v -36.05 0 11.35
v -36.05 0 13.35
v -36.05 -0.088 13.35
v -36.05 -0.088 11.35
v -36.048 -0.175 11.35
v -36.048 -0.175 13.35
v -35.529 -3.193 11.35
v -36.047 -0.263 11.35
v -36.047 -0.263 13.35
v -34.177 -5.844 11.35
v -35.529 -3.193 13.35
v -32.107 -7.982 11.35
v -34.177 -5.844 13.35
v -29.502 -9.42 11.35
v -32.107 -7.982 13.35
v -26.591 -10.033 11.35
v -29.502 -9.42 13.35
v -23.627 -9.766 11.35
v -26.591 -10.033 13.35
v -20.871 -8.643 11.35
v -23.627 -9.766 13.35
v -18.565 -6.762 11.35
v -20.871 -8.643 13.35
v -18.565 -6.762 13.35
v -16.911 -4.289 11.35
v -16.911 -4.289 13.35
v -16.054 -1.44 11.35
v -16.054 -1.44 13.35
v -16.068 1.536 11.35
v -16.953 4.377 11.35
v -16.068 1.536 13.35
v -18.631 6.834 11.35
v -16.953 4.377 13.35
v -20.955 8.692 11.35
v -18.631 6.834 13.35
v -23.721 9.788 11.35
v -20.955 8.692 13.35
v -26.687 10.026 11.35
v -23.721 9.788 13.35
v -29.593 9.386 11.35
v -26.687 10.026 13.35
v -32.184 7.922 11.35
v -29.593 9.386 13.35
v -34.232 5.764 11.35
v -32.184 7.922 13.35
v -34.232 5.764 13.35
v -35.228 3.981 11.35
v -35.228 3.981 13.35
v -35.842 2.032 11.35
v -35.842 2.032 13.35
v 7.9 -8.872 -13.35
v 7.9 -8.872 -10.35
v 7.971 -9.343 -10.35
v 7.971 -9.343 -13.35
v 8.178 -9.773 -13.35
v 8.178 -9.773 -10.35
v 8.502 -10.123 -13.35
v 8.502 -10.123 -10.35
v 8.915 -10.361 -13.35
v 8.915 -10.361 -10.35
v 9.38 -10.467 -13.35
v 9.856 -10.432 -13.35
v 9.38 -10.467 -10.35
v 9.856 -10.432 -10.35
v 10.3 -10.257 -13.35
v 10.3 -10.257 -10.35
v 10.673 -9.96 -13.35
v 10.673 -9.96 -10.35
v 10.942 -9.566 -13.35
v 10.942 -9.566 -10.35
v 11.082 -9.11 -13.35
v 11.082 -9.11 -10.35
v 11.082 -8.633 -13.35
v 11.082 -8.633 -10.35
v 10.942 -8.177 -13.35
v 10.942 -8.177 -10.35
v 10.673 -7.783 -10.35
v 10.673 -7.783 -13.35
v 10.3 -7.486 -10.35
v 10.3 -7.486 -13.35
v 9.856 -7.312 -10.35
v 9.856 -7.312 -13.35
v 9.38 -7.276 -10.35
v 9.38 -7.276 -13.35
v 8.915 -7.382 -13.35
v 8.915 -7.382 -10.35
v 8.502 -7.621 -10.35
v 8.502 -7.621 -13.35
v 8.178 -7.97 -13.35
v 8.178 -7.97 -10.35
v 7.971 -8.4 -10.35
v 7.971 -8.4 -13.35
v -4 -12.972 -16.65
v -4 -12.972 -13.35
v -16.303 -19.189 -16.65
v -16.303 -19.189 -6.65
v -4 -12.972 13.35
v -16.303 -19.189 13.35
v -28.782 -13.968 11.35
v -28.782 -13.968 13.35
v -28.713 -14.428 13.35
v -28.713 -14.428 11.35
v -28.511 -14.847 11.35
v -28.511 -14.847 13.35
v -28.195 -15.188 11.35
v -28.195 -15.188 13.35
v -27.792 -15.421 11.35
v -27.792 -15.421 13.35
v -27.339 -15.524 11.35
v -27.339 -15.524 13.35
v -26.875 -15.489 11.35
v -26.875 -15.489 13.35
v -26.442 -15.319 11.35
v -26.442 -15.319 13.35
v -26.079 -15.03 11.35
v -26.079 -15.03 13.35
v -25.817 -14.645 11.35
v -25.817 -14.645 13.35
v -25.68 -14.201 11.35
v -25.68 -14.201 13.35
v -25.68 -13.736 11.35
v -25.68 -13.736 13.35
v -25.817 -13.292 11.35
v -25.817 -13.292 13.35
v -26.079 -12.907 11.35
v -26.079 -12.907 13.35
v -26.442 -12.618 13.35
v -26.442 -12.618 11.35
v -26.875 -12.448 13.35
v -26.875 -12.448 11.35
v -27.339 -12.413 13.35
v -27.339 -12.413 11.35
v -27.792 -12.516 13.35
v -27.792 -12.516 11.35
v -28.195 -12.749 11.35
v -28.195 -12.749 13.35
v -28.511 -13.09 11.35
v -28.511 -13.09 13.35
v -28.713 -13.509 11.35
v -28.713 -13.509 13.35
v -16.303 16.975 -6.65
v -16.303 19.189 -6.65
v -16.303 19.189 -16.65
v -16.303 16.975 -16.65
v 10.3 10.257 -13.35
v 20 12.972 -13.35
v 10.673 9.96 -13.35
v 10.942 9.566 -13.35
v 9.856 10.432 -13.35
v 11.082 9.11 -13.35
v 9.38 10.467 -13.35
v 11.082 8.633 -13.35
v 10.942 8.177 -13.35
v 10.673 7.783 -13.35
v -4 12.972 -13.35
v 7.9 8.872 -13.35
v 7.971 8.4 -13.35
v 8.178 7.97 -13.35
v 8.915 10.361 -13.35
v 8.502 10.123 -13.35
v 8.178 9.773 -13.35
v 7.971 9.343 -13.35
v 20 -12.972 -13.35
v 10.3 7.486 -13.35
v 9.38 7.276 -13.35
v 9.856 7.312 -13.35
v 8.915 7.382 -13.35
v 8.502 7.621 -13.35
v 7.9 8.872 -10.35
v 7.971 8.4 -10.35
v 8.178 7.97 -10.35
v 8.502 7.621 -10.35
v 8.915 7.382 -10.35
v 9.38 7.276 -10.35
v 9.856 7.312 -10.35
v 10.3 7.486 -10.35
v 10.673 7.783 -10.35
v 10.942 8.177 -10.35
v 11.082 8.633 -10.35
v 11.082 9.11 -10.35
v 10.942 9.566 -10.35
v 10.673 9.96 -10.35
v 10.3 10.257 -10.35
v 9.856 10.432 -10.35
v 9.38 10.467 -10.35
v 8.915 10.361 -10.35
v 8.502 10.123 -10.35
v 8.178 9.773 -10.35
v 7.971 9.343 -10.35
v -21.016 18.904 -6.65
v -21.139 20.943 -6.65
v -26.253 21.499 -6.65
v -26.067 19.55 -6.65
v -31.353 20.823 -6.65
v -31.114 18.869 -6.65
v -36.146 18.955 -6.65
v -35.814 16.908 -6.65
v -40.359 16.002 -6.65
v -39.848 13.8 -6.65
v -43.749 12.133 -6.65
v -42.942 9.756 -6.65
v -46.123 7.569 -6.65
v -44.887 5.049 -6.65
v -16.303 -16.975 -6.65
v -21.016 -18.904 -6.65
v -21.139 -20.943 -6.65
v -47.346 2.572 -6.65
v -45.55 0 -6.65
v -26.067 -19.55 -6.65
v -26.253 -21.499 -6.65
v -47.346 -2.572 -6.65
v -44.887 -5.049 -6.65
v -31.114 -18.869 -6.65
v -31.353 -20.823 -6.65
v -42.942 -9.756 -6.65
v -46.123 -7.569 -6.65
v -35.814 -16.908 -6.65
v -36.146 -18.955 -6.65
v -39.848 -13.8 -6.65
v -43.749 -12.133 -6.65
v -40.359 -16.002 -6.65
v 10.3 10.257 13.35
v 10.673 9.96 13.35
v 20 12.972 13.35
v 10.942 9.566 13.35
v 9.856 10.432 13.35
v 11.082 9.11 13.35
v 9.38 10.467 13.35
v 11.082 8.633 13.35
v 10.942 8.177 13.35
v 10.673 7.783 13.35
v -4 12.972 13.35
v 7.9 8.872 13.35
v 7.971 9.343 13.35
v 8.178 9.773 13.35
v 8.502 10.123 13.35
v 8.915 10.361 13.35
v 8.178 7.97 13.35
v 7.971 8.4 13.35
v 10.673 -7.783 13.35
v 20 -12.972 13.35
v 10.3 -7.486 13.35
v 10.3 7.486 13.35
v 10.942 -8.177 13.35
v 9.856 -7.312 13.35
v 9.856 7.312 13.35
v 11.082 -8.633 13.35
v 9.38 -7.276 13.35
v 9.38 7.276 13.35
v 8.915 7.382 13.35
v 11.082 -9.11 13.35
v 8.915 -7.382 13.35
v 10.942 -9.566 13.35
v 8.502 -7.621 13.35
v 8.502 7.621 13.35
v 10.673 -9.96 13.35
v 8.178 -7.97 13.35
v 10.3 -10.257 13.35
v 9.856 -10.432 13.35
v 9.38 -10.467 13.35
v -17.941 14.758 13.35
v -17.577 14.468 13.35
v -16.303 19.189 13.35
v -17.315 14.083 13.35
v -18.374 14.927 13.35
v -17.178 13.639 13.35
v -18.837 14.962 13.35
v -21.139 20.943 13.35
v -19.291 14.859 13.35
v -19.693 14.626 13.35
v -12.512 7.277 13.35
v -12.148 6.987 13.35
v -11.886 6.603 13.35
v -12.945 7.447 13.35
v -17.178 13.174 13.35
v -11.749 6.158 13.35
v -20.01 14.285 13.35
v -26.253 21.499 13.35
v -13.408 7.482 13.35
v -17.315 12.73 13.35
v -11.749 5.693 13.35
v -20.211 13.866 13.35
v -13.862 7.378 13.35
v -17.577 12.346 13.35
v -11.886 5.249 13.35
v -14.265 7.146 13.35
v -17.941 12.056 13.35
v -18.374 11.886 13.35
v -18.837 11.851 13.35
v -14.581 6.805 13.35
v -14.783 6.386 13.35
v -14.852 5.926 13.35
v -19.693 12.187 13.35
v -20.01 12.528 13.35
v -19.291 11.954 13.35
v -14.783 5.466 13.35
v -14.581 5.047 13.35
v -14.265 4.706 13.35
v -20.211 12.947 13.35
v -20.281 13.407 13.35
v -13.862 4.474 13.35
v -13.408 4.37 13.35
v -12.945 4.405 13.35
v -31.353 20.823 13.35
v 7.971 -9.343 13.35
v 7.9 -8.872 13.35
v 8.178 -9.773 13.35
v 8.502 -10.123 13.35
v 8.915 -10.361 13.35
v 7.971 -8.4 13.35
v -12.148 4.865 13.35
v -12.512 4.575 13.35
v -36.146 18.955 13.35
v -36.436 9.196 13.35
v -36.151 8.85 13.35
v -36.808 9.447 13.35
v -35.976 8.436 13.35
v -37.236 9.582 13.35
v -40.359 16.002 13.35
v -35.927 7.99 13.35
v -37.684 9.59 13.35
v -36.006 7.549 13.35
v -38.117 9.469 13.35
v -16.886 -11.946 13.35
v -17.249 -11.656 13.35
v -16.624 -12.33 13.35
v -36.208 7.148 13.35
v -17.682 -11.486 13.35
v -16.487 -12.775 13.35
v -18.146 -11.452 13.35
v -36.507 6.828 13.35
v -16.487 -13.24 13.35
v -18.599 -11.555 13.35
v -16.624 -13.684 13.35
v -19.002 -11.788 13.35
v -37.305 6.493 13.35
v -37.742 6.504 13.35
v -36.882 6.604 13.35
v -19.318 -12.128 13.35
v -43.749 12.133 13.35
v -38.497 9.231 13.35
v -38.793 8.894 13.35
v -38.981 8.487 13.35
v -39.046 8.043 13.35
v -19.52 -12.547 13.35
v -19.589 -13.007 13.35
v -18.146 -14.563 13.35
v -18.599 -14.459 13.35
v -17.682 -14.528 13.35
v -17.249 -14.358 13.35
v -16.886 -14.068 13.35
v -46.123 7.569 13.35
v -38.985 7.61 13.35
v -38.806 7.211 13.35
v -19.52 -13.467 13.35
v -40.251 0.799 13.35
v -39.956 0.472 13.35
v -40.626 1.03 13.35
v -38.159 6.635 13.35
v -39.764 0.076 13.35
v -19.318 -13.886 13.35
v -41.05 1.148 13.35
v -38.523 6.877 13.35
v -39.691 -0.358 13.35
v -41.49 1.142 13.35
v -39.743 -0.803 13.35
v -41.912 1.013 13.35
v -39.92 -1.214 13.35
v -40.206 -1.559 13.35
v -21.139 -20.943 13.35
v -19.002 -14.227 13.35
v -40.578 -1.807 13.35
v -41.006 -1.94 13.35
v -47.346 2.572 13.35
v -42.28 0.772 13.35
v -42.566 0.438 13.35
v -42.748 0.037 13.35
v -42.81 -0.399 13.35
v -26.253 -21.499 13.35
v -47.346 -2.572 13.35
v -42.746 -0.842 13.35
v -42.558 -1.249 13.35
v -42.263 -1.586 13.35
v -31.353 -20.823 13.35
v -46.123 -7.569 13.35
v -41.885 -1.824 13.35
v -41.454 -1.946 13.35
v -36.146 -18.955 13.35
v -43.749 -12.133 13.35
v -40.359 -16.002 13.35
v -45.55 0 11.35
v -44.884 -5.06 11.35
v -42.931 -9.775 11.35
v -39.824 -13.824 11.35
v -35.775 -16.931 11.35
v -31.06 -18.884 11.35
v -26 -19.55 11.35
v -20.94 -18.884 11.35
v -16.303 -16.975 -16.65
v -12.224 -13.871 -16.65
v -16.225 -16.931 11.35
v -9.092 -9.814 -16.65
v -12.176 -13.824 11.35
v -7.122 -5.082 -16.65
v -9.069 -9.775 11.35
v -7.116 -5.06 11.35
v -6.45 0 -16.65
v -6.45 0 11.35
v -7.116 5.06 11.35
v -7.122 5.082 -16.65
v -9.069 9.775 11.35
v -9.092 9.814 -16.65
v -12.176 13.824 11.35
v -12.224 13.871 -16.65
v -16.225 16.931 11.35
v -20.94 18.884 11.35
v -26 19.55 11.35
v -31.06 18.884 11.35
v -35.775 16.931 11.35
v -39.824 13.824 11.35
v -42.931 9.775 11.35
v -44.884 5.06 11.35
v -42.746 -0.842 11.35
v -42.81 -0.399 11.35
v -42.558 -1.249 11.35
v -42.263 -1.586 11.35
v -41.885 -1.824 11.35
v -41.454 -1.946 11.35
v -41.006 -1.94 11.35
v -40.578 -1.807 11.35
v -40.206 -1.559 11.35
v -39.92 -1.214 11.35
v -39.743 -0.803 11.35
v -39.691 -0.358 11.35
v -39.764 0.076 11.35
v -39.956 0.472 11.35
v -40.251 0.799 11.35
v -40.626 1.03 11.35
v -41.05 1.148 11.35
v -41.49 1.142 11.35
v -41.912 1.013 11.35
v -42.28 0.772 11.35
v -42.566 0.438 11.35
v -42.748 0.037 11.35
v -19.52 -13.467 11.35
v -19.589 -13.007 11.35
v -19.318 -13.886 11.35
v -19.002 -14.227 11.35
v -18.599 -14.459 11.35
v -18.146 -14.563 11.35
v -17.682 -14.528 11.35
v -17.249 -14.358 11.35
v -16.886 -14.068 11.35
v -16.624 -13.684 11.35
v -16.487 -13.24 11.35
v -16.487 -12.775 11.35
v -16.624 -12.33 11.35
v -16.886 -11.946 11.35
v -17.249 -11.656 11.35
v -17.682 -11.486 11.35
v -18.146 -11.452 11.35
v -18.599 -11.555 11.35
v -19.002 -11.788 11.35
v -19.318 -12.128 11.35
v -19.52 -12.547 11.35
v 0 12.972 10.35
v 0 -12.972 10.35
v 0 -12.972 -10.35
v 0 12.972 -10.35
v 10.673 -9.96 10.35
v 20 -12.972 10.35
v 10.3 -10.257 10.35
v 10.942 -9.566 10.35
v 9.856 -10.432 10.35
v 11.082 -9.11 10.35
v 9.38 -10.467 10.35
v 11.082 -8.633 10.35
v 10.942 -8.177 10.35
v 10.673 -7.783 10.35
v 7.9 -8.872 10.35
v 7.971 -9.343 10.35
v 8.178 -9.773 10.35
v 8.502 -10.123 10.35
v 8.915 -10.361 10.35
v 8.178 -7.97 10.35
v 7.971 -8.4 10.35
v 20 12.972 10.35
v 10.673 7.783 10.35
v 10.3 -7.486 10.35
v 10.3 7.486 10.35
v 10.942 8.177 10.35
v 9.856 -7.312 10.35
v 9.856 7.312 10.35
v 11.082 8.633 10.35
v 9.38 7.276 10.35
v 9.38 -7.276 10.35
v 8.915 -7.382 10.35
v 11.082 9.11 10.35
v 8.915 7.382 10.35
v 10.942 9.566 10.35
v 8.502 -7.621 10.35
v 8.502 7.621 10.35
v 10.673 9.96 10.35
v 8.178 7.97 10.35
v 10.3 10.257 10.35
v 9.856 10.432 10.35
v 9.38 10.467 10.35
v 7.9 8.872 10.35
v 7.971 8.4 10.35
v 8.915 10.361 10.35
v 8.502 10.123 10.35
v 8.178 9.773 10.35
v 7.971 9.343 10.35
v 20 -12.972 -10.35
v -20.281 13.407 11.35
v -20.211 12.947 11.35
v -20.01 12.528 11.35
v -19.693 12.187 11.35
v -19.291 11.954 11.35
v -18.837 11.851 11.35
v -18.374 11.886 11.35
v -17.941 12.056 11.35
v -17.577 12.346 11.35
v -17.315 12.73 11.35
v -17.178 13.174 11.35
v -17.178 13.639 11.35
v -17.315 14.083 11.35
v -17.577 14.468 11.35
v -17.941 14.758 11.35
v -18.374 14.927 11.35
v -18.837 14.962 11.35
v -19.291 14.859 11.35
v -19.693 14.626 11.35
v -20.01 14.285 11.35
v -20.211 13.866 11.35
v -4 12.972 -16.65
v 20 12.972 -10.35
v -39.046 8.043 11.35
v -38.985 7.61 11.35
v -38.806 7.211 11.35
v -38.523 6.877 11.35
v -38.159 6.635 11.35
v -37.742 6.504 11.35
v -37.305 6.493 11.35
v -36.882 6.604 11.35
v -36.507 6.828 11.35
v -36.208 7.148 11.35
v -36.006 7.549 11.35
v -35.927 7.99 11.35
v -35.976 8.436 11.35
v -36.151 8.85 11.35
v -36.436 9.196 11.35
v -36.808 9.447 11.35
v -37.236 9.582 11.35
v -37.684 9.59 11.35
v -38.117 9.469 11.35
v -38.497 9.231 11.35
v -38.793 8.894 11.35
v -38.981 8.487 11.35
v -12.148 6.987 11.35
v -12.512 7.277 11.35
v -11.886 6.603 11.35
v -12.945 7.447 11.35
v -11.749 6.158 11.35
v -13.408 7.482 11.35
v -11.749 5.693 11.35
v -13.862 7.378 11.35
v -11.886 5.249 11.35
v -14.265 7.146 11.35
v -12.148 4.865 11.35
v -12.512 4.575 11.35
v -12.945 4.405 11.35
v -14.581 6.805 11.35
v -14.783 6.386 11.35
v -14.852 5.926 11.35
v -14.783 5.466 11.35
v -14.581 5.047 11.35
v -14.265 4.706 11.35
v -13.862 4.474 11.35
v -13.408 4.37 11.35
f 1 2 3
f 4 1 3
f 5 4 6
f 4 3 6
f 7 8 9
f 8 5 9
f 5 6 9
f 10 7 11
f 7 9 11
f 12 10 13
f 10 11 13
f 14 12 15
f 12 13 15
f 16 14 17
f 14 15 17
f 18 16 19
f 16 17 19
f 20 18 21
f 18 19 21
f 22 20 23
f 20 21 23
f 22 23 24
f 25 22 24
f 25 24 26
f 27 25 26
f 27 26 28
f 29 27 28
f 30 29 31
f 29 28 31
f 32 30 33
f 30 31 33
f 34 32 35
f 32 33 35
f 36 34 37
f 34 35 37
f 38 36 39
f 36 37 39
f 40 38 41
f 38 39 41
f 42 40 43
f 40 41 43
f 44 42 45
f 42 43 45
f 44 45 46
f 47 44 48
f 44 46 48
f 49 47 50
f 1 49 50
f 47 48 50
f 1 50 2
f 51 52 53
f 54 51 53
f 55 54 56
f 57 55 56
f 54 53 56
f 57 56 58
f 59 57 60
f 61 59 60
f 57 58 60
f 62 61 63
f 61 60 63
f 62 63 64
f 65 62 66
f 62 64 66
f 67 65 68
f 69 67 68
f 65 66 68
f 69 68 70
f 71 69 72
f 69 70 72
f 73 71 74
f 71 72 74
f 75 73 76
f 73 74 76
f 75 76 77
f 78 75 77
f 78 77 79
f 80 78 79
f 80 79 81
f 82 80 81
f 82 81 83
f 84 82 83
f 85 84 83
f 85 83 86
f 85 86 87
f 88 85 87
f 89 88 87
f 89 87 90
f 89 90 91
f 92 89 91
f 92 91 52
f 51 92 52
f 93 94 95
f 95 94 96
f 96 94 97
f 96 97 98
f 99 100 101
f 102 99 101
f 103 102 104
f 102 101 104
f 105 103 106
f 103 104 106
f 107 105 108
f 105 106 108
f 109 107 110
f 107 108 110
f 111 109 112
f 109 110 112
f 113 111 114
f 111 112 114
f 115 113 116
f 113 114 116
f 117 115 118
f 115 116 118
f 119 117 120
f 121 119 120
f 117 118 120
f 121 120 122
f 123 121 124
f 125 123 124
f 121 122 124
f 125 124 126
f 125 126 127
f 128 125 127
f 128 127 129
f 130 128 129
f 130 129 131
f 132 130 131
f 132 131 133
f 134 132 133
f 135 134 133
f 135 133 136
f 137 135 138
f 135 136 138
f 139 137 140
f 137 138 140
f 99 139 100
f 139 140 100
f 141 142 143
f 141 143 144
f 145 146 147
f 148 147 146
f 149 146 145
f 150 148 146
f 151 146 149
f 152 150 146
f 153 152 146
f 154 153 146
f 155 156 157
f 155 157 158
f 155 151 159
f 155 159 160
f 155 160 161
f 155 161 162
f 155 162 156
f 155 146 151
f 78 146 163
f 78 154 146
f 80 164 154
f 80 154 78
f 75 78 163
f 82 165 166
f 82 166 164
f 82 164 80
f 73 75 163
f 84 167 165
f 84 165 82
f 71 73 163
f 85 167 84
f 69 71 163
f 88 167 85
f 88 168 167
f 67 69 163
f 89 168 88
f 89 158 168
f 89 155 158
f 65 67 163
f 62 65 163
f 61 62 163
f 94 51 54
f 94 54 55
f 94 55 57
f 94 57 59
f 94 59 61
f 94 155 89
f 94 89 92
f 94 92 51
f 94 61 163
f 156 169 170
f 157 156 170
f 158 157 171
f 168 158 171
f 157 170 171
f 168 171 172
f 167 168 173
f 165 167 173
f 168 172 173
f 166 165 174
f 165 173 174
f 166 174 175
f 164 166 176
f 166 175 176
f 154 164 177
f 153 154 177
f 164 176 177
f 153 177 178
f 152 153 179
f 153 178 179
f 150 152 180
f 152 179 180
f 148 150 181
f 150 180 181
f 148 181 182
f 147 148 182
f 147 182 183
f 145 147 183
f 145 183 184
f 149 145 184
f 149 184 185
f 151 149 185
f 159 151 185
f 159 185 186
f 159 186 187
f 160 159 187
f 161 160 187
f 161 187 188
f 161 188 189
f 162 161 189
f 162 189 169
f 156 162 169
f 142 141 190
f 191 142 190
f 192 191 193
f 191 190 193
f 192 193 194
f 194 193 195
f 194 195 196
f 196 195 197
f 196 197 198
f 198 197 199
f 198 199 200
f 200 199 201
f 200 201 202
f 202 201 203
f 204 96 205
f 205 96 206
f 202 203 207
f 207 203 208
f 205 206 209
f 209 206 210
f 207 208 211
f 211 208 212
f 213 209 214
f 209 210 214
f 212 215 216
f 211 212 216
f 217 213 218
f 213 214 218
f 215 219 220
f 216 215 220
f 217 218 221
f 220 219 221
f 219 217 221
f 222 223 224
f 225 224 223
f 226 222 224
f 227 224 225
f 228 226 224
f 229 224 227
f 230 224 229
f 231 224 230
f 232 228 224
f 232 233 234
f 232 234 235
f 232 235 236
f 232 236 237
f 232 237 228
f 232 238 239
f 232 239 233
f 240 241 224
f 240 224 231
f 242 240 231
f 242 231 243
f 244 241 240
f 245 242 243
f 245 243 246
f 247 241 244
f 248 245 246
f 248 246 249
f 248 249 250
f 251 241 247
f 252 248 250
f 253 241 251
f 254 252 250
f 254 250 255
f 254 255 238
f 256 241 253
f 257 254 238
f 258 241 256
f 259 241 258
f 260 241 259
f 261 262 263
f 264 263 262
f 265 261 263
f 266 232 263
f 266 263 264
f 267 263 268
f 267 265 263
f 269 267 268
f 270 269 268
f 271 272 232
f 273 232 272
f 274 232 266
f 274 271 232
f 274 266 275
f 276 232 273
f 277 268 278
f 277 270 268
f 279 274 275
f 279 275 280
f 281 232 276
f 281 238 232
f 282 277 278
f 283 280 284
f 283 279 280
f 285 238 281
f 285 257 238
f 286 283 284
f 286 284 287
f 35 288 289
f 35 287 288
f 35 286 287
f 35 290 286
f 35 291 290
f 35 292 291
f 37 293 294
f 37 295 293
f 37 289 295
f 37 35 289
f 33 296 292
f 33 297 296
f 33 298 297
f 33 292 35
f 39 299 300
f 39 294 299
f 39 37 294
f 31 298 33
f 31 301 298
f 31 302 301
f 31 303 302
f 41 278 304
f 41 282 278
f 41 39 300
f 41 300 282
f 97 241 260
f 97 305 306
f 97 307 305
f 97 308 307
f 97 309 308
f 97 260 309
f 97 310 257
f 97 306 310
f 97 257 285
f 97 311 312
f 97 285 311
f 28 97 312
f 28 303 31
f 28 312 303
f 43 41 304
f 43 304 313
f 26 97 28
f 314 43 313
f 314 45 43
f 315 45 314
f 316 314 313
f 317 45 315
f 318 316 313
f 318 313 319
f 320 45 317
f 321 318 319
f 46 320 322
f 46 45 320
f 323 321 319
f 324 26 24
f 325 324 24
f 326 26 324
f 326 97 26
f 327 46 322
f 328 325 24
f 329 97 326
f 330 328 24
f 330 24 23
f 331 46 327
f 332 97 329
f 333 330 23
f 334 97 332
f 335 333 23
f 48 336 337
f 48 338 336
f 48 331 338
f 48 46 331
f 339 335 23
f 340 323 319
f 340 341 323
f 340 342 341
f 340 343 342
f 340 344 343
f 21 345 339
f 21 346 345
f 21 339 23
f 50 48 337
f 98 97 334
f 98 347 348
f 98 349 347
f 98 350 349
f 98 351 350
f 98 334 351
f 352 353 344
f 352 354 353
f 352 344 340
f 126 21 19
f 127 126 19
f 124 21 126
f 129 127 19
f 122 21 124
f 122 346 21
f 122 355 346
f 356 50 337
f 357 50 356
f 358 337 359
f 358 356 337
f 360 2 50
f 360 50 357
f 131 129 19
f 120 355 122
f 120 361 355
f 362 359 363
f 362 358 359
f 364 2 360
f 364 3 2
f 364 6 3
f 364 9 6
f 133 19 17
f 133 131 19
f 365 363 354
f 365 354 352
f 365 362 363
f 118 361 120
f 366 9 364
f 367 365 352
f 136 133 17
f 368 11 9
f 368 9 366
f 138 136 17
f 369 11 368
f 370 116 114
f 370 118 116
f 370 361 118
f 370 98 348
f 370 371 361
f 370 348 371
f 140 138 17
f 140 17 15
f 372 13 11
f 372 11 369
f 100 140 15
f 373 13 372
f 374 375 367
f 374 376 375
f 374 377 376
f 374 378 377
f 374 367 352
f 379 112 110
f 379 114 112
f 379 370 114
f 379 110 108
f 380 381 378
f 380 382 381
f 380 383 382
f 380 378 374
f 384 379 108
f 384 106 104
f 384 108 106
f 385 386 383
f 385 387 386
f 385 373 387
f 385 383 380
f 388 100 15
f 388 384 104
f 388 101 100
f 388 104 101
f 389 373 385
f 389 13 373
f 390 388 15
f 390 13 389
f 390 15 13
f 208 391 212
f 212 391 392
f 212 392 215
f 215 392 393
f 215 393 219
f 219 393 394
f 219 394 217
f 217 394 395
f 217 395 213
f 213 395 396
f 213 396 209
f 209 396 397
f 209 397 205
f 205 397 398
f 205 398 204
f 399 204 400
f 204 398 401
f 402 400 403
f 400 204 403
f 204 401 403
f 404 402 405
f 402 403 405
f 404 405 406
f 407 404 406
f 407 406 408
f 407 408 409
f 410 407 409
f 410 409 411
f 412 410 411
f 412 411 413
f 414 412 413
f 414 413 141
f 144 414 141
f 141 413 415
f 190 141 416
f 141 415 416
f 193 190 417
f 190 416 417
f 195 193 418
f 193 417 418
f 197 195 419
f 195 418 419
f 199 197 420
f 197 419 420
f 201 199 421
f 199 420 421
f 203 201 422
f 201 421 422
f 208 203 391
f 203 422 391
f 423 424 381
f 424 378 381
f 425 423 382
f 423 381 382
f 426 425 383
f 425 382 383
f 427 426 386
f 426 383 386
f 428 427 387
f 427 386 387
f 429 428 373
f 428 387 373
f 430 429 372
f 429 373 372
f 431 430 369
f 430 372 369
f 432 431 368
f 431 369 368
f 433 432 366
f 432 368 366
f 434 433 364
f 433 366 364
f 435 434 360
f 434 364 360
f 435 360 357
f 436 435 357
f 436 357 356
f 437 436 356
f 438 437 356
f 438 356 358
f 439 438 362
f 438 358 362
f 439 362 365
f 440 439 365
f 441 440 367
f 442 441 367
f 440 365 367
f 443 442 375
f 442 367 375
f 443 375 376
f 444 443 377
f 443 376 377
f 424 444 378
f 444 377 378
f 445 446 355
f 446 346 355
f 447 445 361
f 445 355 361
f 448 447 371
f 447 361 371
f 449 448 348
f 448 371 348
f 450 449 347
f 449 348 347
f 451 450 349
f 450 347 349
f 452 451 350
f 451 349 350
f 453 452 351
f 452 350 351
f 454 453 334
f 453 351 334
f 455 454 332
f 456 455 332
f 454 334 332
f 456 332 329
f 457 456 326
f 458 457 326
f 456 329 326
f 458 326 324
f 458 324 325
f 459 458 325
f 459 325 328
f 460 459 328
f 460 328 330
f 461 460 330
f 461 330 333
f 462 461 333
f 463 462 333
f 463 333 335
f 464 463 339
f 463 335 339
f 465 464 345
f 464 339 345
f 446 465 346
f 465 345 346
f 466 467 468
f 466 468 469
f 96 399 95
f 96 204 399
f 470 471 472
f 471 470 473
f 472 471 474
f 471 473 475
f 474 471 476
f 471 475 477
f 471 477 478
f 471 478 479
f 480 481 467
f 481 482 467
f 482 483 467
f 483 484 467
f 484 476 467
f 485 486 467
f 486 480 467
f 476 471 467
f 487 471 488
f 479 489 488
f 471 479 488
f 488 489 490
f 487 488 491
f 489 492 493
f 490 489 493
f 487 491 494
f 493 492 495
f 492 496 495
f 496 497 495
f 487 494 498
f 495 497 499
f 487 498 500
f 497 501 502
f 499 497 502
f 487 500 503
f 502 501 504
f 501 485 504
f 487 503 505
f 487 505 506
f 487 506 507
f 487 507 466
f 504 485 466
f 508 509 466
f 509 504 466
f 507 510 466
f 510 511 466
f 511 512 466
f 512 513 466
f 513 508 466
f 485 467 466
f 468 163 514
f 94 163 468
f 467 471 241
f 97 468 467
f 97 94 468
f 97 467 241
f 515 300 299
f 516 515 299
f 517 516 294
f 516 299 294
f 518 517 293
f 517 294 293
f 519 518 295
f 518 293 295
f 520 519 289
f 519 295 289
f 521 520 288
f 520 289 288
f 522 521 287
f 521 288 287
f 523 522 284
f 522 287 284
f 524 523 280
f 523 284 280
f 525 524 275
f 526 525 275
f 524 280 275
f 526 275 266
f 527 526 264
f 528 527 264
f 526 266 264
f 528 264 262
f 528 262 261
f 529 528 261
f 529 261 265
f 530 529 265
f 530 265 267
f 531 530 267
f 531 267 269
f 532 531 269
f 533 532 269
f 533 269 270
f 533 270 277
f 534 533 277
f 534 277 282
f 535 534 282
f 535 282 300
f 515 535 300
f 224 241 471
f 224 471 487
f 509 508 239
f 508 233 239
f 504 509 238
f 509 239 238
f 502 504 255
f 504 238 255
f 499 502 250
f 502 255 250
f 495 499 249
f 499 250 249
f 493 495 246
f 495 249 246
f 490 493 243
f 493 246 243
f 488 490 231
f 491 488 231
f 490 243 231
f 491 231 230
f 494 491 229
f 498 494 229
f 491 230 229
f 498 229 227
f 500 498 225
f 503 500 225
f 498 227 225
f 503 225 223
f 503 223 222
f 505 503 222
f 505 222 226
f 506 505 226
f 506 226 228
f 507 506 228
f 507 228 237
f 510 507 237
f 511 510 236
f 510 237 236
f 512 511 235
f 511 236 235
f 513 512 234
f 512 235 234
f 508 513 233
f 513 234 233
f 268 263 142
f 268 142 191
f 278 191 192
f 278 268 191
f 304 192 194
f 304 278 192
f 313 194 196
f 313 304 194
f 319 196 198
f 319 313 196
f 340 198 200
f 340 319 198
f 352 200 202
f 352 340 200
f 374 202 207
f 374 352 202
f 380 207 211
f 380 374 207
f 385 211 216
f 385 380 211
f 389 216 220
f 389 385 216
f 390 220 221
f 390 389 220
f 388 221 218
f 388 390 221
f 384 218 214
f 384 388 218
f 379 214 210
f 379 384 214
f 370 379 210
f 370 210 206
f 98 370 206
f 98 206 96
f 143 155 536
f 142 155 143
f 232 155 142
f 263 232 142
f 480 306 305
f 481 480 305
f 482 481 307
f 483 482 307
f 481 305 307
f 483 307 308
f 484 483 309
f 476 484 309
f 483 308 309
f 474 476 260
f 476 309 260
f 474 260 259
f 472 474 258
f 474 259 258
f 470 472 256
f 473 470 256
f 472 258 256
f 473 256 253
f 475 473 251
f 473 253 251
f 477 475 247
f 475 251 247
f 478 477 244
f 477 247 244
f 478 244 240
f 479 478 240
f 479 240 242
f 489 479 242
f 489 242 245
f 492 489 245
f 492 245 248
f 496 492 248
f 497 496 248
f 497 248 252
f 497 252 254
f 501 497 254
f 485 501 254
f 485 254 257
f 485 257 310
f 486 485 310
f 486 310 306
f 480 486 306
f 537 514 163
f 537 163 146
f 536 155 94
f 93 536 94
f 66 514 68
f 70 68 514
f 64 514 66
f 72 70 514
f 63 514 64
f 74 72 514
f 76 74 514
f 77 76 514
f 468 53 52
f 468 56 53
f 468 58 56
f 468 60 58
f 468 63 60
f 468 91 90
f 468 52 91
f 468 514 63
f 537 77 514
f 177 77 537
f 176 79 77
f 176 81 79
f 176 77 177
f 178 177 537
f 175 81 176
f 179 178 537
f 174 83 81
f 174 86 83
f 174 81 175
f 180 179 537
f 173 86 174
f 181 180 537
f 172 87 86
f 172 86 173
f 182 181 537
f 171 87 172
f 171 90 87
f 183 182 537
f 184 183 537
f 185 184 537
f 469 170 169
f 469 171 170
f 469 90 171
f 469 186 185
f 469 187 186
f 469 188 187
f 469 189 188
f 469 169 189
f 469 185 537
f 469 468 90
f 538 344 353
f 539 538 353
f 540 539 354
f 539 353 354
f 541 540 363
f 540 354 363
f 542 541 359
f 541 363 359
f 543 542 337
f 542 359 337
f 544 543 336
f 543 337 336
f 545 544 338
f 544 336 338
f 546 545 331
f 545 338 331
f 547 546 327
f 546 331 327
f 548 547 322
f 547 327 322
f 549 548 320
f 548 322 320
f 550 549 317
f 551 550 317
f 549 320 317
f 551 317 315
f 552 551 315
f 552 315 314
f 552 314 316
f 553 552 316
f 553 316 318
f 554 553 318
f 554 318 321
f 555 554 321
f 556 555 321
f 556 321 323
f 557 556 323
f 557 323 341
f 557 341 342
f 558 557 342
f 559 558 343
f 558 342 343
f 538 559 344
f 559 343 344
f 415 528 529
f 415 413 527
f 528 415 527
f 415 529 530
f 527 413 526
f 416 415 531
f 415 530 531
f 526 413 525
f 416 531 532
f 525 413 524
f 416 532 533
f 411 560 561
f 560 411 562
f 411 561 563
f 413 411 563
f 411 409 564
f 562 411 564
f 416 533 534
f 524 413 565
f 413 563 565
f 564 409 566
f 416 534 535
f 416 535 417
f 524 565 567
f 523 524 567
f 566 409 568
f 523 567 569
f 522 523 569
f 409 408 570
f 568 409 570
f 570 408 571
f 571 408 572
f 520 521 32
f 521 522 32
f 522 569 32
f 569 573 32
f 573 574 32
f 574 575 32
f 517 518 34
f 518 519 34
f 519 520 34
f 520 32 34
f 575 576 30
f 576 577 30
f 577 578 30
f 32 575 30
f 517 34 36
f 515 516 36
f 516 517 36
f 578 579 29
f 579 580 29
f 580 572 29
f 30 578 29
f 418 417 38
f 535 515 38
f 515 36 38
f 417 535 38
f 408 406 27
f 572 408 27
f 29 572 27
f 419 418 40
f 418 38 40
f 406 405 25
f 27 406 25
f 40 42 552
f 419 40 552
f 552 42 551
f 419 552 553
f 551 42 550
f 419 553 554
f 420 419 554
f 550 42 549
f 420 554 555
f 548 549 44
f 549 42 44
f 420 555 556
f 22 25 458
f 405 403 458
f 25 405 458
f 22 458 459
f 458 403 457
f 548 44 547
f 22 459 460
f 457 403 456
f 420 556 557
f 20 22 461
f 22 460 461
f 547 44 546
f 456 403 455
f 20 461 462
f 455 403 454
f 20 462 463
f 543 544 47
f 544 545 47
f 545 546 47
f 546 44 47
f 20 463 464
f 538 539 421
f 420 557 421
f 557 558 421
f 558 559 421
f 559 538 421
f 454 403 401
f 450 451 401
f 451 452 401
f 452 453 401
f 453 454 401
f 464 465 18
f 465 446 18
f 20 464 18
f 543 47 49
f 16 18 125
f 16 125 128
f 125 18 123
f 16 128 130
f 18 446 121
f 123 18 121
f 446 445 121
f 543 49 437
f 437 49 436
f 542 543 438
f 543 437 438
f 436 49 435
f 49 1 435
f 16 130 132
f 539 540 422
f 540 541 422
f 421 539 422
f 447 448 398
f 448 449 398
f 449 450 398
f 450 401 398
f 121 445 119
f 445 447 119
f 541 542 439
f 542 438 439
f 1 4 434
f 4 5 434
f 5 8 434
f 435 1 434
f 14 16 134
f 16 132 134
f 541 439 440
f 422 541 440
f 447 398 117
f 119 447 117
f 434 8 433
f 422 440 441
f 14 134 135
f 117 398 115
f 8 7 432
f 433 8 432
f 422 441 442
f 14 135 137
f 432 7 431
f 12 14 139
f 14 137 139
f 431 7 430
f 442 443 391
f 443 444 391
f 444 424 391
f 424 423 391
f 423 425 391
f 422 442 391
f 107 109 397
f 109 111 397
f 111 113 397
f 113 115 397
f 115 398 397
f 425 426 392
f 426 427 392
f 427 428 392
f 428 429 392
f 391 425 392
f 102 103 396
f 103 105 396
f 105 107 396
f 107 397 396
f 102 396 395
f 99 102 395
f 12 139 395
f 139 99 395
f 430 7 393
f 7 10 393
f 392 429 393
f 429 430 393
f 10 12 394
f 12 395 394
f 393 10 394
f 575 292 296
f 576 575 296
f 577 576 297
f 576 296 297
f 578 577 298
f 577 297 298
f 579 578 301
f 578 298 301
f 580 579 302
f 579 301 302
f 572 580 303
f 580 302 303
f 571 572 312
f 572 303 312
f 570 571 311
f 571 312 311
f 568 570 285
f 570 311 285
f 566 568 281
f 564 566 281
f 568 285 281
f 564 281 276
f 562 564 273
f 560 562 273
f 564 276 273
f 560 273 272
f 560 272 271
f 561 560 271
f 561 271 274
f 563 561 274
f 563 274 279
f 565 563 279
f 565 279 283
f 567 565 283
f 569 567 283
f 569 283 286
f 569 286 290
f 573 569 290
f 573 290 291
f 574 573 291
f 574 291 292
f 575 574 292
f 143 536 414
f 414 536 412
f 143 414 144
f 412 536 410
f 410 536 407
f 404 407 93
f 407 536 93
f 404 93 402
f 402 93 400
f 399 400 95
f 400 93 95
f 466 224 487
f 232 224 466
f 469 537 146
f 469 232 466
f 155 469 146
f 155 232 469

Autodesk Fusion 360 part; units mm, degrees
sketch "Sketch1" plane through (0, 0, 0) normal (1, 0, 0) x (0, 1, 0)
  line L0 (10, -10.35) -> (-10, -10.35)
  line L1 (-10, -10.35) -> (-10, 10.35)
  line L2 (-10, 10.35) -> (10, 10.35)
  line L3 (10, 10.35) -> (10, -10.35)
  line L4 (10, -10.35) -> (-10, 10.35) construction
  line L5 (-10, -10.35) -> (10, 10.35) construction
  line L6 (12.9717, -13.35) -> (-12.9717, -13.35)
  line L7 (-12.9717, -13.35) -> (-12.9717, 13.35)
  line L8 (-12.9717, 13.35) -> (12.9717, 13.35)
  line L9 (12.9717, 13.35) -> (12.9717, -13.35)
  line L10 (12.9717, -13.35) -> (-12.9717, 13.35) construction
  line L11 (-12.9717, -13.35) -> (12.9717, 13.35) construction
  line L12 (10, 10.35) -> (12.9717, 10.35)
  line L13 (-10, 10.35) -> (-12.9717, 10.35)
  line L14 (-10, -10.35) -> (-12.9717, -10.35)
  line L15 (-12.9717, -10.35) -> (12.9717, -10.35)
  dimension "d1" = 20
  dimension "d2" = 20.7
  dimension "d3" = 26.7
extrude "Extrude1" add sketch "Sketch1" along normal blind 20 contours L0 L6 L7 L9 L14 L15 | L2 L7 L8 L9 L12 L13 makes body 1 at (6.6667, -4.3239, 10.35) makes body 2 at (13.3333, -4.3239, -10.35)
extrude "Extrude2" add sketch "Sketch1" against normal blind 4 separate body contours L0 L1 L2 L3 L15 | L3 L9 L12 L15 | L1 L7 L13 L14 L15 makes body 3
extrude "Extrude3" add sketch "Sketch1" against normal blind 4 contours L0 L6 L7 L9 L14 L15 | L2 L7 L8 L9 L12 L13 bodies 1 2 3
sketch "Sketch2" plane through (0, 0, 13.35) normal (0, 0, 1) x (-1, 0, 0)
  line L0 (4, 12.9717) -> (-20, 12.9717)
  line L1 (-20, 12.9717) -> (-20, -12.9717)
  line L2 (-20, -12.9717) -> (4, -12.9717)
  line L3 (4, -12.9717) -> (4, 12.9717)
  line L4 (4, 0) -> (26, 0)
  circle A0 centre (26, 0) radius 19.55
  circle A1 centre (26, 0) radius 14 construction
  circle A2 centre (26, 0) radius 15.25 construction
  line L5 (26, 0) -> (26, -14)
  circle A3 centre (26, 0) radius 21.5
  line L6 (4, -12.9717) -> (16.3028, -19.1889)
  line L7 (4, 12.9717) -> (16.3028, 19.1889)
  circle A4 centre (26, 0) radius 10.05
  line L8 (-20, -12.9717) -> (-9.5, -12.9717)
  line L9 (-9.5, -12.9717) -> (-9.5, -8.8717)
  circle A5 centre (-9.5, -8.8717) radius 1.6
  line L10 (4, 0) -> (-20, 0) construction
  circle A6 centre (-9.5, 8.8717) radius 1.6
  line L11 (16.3028, -19.1889) -> (16.3028, 19.1889)
  line L12 (26, 0) -> (37.486, -8.0426)
  circle A7 centre (37.486, -8.0426) radius 1.56
  circle A8 centre (27.2221, 13.9685) radius 1.56
  circle A9 centre (13.2919, -5.9259) radius 1.56
  line L13 (26, 0) -> (25.9989, 0)
  line L14 (26, 0) -> (41.25, 0.3993)
  line L15 (26, 0) -> (41, 0) construction
  circle A10 centre (41.25, 0.3993) radius 1.56
  circle A11 centre (18.0292, 13.0072) radius 1.56
  circle A12 centre (18.7208, -13.4066) radius 1.56
  dimension "d22" = 22
  dimension "d23" = 39.1
  dimension "d24" = 28
  dimension "d25" = 30.5
  dimension "d26" = 14
  dimension "d32" = 43
  dimension "d33" = 20.1
  dimension "d38" = 10.5
  dimension "d39" = 4.1
  dimension "d40" = 3.2
  dimension "d56" = 3.12
  dimension "d66" = 1.5
  dimension "d67" = 3.12
  dimension "d68" = 15.25
  dimension "d70" = 360
extrude "Extrude4" add sketch "Sketch2" against normal blind 2 separate body contours L4 A0 A4 L11 | A0 A4 L11 | L4 A0 A4 L11 makes body 4
extrude "Extrude5" add sketch "Sketch2" against normal blind 30 contours L3 L4 A3 L7 | L3 L4 A3 L6 | L4 A0 A3 L11 | L4 A0 A3 L11 bodies 1 4
extrude "Extrude6" cut sketch "Sketch2" against normal blind 34 contours A5 | A6 bodies 1
extrude "Extrude7" add sketch "Sketch2" against normal blind 20 contours A0 A3 L11 bodies 1
equation "d68 = ( 30.5 / 2 ) * 1 mm"
